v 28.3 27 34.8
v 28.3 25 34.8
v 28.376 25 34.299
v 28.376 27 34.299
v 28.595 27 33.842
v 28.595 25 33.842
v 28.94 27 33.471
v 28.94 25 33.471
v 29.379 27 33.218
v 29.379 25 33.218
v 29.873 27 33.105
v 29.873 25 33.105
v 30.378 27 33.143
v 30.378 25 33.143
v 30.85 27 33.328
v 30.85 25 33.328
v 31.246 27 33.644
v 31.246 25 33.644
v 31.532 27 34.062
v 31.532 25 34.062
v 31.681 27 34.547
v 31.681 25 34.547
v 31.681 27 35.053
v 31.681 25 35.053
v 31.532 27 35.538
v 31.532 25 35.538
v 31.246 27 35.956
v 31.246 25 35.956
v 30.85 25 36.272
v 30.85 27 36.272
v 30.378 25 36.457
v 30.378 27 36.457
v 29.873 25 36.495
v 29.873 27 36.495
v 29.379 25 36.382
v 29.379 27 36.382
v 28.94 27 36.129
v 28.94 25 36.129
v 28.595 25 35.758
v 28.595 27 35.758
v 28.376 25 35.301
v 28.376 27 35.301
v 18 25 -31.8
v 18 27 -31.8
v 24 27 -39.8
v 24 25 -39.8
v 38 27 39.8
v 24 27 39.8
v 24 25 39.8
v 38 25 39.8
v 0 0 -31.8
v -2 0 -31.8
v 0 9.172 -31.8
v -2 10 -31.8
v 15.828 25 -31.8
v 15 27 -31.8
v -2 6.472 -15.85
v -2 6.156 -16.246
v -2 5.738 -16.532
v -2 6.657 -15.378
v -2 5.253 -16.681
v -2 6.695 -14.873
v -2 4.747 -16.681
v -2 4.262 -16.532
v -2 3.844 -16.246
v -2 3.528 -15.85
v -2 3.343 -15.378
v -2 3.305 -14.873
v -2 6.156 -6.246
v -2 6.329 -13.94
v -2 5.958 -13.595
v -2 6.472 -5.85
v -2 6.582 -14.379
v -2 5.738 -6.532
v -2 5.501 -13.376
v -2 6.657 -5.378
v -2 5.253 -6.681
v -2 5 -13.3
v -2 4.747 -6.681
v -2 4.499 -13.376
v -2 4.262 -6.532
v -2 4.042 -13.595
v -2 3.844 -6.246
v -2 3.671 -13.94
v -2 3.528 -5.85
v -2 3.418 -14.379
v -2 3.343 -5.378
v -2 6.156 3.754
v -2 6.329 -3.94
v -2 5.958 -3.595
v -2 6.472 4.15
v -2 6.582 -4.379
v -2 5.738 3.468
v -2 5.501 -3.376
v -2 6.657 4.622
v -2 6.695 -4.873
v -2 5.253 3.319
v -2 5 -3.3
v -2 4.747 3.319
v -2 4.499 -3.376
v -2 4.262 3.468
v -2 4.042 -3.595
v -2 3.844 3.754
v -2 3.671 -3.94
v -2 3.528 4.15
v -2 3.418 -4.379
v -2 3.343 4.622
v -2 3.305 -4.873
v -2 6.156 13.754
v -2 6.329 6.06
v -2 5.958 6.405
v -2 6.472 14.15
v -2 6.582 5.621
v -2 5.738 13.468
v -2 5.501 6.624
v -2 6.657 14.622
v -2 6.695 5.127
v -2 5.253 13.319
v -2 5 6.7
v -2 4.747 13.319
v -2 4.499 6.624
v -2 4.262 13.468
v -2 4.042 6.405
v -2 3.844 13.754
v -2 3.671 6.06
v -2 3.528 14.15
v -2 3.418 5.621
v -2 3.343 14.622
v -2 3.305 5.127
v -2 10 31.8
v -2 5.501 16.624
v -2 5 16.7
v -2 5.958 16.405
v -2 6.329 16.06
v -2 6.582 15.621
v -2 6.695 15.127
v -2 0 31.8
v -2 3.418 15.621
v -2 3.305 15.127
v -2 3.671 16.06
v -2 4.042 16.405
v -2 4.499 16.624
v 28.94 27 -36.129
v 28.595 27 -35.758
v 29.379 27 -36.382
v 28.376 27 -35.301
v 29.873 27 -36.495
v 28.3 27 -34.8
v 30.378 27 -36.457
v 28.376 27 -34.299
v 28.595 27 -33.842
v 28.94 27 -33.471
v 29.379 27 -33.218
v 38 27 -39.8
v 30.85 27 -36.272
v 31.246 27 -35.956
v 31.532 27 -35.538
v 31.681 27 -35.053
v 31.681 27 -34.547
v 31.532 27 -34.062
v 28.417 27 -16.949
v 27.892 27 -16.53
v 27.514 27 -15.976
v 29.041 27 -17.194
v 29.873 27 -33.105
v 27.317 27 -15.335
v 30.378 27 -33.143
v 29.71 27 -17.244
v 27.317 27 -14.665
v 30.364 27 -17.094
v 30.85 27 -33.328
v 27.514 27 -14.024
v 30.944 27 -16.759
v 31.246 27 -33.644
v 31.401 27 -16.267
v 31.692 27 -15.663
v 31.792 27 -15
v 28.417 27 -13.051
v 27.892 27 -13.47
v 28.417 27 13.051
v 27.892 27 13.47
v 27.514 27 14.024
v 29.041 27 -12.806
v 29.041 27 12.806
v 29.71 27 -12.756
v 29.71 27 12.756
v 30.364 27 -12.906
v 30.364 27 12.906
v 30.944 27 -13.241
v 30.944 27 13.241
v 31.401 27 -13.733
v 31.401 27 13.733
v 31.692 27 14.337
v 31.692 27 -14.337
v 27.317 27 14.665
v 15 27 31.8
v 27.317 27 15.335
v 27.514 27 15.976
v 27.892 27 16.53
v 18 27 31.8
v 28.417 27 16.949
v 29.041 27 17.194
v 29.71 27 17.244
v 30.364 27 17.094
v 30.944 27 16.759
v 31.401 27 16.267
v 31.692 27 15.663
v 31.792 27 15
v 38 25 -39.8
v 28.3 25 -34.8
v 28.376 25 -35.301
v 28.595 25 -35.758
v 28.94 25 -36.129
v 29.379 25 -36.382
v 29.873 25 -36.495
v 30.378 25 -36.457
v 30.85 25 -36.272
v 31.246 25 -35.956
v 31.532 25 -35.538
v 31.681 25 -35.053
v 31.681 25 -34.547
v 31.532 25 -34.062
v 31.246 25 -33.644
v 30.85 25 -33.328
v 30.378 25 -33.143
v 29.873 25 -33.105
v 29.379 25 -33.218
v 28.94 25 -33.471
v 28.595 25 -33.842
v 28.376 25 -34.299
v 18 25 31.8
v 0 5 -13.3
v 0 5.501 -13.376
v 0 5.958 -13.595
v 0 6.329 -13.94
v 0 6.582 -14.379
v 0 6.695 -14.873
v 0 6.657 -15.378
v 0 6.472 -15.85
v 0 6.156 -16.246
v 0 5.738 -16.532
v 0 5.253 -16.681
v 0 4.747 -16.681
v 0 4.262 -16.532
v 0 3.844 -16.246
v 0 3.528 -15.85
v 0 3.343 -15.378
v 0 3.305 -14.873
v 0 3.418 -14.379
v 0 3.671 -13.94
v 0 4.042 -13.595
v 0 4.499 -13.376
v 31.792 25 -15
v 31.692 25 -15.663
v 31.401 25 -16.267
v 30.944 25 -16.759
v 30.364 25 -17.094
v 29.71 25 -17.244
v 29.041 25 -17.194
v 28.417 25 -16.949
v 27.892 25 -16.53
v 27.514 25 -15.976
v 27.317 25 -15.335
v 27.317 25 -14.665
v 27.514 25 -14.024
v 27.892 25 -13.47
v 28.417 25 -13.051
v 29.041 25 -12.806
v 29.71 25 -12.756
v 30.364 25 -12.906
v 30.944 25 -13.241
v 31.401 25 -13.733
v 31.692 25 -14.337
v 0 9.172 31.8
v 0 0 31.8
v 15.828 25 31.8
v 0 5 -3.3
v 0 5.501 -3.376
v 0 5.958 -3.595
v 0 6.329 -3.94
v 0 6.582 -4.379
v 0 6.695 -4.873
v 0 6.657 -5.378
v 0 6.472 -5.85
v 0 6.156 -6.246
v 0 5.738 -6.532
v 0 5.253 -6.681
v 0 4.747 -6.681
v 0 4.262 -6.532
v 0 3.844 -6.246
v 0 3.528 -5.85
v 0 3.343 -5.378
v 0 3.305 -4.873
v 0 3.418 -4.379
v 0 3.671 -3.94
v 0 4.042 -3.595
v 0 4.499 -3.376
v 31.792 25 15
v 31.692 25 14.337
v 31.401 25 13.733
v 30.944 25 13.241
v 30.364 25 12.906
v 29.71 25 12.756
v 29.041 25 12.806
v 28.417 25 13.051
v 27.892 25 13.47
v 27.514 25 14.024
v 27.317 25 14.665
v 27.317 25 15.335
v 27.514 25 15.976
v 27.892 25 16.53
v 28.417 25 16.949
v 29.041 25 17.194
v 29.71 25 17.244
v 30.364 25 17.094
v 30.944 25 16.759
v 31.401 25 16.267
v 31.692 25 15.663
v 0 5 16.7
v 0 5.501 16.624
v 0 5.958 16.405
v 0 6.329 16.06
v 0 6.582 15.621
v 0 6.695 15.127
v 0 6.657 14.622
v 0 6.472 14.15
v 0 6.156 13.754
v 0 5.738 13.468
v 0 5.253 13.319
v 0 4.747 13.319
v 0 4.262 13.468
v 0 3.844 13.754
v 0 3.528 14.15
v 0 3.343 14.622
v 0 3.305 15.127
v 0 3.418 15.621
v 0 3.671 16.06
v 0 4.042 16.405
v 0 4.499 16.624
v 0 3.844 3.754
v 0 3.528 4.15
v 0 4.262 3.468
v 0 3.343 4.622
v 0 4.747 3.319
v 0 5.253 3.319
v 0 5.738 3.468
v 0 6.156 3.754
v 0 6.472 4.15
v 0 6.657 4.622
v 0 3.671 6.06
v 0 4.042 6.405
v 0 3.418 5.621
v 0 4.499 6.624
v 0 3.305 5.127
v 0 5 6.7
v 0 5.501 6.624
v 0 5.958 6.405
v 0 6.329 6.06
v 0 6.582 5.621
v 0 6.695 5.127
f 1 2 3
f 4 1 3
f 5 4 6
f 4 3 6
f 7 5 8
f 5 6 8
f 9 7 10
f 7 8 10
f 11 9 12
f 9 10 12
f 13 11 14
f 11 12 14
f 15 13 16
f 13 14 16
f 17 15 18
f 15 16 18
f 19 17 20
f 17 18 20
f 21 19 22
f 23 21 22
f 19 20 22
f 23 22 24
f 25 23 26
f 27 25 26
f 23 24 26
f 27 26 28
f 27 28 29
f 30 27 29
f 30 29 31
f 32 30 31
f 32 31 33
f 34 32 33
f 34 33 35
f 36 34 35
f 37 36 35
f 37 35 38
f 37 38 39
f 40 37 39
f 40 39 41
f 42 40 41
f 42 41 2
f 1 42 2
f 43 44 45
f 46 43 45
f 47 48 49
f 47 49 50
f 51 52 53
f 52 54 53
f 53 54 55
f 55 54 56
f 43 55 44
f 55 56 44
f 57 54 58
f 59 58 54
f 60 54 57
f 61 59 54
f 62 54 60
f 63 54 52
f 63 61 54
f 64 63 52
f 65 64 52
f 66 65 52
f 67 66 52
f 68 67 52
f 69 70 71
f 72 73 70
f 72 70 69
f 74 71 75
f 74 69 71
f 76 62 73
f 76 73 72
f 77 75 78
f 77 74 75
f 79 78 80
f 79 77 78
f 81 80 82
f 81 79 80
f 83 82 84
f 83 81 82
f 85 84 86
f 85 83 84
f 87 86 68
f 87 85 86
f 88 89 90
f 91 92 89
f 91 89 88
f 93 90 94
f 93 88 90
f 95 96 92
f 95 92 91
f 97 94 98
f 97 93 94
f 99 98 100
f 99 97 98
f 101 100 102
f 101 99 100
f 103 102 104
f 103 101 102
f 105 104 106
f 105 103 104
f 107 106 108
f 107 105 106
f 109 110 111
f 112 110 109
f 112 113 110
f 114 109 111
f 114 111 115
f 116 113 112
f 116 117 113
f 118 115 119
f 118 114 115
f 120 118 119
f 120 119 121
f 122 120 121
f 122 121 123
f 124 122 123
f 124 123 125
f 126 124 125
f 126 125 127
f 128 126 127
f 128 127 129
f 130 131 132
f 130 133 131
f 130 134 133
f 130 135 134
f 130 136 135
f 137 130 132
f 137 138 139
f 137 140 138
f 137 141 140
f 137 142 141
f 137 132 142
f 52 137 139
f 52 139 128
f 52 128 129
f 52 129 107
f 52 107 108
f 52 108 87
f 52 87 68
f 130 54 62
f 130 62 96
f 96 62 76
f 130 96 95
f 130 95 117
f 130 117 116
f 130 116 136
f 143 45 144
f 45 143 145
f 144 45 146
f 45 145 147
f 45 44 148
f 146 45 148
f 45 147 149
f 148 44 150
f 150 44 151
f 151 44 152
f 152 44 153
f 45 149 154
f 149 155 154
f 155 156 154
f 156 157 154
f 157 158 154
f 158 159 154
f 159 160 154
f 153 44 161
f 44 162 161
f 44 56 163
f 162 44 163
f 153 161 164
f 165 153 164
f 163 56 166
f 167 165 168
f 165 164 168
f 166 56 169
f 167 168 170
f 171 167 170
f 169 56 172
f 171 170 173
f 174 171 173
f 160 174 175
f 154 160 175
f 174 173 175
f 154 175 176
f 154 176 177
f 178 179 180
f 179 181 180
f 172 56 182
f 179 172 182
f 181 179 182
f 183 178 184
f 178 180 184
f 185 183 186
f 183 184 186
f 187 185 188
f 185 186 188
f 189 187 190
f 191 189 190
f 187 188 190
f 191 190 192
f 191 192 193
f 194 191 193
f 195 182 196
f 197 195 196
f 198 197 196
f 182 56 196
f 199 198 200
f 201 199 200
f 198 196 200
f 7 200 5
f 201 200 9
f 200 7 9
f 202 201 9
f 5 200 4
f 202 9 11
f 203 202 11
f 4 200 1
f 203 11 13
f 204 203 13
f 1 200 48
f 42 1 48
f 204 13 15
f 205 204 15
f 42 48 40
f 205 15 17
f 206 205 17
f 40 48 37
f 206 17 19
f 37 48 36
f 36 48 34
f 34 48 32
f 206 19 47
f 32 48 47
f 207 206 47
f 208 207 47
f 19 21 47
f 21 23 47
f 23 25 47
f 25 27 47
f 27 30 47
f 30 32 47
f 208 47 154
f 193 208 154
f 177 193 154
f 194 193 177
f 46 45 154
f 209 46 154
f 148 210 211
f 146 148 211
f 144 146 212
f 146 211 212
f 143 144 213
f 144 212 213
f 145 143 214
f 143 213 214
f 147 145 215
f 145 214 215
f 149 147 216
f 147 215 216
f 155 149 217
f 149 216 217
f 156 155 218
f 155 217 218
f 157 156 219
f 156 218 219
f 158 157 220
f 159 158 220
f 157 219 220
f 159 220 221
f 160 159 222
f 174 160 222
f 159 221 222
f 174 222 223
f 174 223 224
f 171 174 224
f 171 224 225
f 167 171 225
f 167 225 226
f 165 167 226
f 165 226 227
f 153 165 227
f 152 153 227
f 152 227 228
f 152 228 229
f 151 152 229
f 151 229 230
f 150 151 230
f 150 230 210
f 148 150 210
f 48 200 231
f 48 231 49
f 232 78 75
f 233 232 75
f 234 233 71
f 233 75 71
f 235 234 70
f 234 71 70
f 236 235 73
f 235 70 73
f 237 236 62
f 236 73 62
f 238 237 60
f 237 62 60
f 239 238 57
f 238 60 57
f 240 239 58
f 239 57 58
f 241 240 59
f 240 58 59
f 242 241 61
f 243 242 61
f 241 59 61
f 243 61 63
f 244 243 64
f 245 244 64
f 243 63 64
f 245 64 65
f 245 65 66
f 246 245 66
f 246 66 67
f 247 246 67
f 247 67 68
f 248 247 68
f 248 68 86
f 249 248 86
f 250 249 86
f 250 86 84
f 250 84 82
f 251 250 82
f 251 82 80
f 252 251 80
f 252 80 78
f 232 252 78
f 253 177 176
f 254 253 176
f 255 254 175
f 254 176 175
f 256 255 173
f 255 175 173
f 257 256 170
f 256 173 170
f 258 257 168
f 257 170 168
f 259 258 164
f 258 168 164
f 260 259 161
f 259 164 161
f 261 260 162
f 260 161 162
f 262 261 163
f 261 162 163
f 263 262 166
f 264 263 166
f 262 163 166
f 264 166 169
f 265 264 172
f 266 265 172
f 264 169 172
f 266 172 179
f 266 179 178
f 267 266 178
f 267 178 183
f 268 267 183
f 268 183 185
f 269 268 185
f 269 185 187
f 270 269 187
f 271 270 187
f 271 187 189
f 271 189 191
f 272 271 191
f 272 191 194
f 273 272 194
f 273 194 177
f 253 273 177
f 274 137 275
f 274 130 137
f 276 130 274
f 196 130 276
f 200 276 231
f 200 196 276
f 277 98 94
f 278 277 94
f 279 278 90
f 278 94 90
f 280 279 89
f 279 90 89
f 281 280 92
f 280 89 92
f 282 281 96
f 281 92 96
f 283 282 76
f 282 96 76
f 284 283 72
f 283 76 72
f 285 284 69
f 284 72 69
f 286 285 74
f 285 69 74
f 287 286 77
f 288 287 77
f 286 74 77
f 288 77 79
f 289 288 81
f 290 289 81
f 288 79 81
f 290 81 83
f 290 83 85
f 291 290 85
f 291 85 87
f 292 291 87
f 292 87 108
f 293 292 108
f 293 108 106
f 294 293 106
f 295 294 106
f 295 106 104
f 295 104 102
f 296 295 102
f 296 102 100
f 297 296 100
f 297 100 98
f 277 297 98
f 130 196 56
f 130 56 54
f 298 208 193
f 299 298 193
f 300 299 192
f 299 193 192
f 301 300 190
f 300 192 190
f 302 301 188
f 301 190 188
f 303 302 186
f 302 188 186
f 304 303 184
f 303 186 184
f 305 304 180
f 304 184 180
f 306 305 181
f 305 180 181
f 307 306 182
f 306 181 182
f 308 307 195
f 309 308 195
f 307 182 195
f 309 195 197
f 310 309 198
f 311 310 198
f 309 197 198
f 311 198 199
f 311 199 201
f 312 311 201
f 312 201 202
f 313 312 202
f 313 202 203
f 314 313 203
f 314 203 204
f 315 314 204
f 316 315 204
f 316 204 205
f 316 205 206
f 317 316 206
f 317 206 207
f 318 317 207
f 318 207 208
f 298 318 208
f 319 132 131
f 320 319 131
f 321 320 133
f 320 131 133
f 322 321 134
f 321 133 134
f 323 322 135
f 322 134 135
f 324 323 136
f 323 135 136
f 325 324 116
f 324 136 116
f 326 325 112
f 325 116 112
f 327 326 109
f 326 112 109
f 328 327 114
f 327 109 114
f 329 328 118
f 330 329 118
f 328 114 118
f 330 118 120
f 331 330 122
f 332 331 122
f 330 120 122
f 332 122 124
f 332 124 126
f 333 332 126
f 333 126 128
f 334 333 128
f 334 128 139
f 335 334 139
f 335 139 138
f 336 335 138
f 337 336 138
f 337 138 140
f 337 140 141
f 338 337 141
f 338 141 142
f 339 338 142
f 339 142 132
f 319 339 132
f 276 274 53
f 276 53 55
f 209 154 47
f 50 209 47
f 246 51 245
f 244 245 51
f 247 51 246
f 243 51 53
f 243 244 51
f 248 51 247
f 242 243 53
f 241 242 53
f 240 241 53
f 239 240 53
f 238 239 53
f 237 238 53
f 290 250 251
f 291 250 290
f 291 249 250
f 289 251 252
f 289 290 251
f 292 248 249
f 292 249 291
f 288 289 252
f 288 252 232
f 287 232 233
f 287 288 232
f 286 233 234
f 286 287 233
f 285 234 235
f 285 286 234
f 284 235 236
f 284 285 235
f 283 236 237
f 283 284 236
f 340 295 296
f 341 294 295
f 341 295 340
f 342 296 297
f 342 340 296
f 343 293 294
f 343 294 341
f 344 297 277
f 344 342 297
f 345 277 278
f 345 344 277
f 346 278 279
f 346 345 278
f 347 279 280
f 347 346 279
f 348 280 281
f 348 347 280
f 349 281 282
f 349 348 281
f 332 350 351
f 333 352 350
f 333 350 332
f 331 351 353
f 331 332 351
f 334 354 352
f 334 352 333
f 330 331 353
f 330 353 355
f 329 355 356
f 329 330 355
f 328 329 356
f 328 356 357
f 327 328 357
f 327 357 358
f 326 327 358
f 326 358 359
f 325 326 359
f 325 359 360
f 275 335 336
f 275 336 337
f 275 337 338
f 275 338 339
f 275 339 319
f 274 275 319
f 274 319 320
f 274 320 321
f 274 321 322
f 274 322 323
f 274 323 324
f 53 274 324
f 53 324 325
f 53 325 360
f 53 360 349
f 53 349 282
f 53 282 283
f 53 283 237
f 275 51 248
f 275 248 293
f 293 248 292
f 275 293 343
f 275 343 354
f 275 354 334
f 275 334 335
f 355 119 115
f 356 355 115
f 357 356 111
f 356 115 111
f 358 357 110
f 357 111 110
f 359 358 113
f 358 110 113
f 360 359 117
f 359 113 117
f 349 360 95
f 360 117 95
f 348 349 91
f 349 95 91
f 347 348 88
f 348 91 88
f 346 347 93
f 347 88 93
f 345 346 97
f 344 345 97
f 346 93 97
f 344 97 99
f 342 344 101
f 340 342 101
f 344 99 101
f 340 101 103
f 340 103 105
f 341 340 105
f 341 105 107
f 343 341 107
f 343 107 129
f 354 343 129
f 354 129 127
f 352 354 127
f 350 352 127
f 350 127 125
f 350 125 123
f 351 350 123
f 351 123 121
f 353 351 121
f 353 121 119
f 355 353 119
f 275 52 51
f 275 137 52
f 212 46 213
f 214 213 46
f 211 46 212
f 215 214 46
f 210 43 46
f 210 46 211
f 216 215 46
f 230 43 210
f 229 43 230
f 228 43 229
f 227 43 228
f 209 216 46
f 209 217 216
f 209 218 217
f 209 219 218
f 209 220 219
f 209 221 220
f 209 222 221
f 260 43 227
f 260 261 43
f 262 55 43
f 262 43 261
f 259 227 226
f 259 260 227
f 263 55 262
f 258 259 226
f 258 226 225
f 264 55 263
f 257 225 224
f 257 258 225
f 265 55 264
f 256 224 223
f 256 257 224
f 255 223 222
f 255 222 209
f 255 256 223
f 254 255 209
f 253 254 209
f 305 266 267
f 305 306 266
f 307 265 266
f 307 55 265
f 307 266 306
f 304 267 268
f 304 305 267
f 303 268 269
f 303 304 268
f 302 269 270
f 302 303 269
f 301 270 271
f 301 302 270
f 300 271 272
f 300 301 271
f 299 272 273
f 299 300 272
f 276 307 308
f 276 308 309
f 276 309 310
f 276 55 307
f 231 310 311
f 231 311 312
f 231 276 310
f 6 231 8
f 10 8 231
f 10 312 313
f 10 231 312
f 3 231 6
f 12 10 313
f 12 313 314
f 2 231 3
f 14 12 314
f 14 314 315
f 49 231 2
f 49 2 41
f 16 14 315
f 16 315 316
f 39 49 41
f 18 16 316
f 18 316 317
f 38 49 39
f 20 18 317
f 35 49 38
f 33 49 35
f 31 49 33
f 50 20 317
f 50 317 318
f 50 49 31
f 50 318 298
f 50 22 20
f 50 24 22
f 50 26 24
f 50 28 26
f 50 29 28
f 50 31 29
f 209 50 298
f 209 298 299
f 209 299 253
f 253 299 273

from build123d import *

# Parameters (mm, degrees)
BOSS_EXTRUDE1_DEPTH      = 31.8
M3_CLEARANCE_HOLE1_D     = 3.4
M3_CLEARANCE_HOLE1_DEPTH = 5
M3_CLEARANCE_HOLE1_TIP   = 1.021463052
BOSS_EXTRUDE2_DEPTH      = 2
M3_CLEARANCE_HOLE2_D     = 3.4
M3_CLEARANCE_HOLE2_DEPTH = 5
M3_CLEARANCE_HOLE2_TIP   = 1.021463052
M4_CLEARANCE_HOLE1_D     = 4.5


with BuildPart() as part:
    # Sketch1 → Boss-Extrude1 (new body, symmetric)
    with BuildSketch(Plane.XY):
        Polygon((0, 0), (0, 9.171572875), (15.828427125, 25), (38, 25), (38, 27), (15, 27), (-2, 10), (-2, 0), align=None)
    extrude(amount=BOSS_EXTRUDE1_DEPTH, both=True)

    # M3 Clearance Hole1
    with Locations(Plane(origin=(0, 0, 0), x_dir=(0, 0, -1), z_dir=(1, 0, 0))):
        with Locations((5, 5), (-5, 5), (-15, 5), (15, 5)):
            Hole(M3_CLEARANCE_HOLE1_D / 2, depth=M3_CLEARANCE_HOLE1_DEPTH)
            with Locations((0, 0, -(M3_CLEARANCE_HOLE1_DEPTH + M3_CLEARANCE_HOLE1_TIP / 2))):  # 118° drill point
                Cone(0, M3_CLEARANCE_HOLE1_D / 2, M3_CLEARANCE_HOLE1_TIP, mode=Mode.SUBTRACT)

    # Sketch4 → Boss-Extrude2 (add)
    with BuildSketch(Plane(origin=(0, 27, 0), x_dir=(1, 0, 0), z_dir=(0, 1, 0))):
        Polygon((18, -31.8), (24, -39.8), (38, -39.8), (38, -31.8), align=None)
    boss_extrude2 = extrude(amount=-BOSS_EXTRUDE2_DEPTH)

    # Mirror1: Boss-Extrude2 across plane
    add(boss_extrude2.mirror(Plane.XY))

    # M3 Clearance Hole2
    with Locations(Plane(origin=(0, 27, 0), x_dir=(1, 0, 0), z_dir=(0, 1, 0))):
        with Locations((30, 34.8), (30, -34.8)):
            Hole(M3_CLEARANCE_HOLE2_D / 2, depth=M3_CLEARANCE_HOLE2_DEPTH)
            with Locations((0, 0, -(M3_CLEARANCE_HOLE2_DEPTH + M3_CLEARANCE_HOLE2_TIP / 2))):  # 118° drill point
                Cone(0, M3_CLEARANCE_HOLE2_D / 2, M3_CLEARANCE_HOLE2_TIP, mode=Mode.SUBTRACT)

    # M4 Clearance Hole1 (through all)
    with Locations(Plane(origin=(0, 25, 0), x_dir=(-1, 0, 0), z_dir=(0, -1, 0))):
        with Locations((-29.541515225, 15), (-29.541515225, -15)):
            Hole(M4_CLEARANCE_HOLE1_D / 2)


solid = part.part
